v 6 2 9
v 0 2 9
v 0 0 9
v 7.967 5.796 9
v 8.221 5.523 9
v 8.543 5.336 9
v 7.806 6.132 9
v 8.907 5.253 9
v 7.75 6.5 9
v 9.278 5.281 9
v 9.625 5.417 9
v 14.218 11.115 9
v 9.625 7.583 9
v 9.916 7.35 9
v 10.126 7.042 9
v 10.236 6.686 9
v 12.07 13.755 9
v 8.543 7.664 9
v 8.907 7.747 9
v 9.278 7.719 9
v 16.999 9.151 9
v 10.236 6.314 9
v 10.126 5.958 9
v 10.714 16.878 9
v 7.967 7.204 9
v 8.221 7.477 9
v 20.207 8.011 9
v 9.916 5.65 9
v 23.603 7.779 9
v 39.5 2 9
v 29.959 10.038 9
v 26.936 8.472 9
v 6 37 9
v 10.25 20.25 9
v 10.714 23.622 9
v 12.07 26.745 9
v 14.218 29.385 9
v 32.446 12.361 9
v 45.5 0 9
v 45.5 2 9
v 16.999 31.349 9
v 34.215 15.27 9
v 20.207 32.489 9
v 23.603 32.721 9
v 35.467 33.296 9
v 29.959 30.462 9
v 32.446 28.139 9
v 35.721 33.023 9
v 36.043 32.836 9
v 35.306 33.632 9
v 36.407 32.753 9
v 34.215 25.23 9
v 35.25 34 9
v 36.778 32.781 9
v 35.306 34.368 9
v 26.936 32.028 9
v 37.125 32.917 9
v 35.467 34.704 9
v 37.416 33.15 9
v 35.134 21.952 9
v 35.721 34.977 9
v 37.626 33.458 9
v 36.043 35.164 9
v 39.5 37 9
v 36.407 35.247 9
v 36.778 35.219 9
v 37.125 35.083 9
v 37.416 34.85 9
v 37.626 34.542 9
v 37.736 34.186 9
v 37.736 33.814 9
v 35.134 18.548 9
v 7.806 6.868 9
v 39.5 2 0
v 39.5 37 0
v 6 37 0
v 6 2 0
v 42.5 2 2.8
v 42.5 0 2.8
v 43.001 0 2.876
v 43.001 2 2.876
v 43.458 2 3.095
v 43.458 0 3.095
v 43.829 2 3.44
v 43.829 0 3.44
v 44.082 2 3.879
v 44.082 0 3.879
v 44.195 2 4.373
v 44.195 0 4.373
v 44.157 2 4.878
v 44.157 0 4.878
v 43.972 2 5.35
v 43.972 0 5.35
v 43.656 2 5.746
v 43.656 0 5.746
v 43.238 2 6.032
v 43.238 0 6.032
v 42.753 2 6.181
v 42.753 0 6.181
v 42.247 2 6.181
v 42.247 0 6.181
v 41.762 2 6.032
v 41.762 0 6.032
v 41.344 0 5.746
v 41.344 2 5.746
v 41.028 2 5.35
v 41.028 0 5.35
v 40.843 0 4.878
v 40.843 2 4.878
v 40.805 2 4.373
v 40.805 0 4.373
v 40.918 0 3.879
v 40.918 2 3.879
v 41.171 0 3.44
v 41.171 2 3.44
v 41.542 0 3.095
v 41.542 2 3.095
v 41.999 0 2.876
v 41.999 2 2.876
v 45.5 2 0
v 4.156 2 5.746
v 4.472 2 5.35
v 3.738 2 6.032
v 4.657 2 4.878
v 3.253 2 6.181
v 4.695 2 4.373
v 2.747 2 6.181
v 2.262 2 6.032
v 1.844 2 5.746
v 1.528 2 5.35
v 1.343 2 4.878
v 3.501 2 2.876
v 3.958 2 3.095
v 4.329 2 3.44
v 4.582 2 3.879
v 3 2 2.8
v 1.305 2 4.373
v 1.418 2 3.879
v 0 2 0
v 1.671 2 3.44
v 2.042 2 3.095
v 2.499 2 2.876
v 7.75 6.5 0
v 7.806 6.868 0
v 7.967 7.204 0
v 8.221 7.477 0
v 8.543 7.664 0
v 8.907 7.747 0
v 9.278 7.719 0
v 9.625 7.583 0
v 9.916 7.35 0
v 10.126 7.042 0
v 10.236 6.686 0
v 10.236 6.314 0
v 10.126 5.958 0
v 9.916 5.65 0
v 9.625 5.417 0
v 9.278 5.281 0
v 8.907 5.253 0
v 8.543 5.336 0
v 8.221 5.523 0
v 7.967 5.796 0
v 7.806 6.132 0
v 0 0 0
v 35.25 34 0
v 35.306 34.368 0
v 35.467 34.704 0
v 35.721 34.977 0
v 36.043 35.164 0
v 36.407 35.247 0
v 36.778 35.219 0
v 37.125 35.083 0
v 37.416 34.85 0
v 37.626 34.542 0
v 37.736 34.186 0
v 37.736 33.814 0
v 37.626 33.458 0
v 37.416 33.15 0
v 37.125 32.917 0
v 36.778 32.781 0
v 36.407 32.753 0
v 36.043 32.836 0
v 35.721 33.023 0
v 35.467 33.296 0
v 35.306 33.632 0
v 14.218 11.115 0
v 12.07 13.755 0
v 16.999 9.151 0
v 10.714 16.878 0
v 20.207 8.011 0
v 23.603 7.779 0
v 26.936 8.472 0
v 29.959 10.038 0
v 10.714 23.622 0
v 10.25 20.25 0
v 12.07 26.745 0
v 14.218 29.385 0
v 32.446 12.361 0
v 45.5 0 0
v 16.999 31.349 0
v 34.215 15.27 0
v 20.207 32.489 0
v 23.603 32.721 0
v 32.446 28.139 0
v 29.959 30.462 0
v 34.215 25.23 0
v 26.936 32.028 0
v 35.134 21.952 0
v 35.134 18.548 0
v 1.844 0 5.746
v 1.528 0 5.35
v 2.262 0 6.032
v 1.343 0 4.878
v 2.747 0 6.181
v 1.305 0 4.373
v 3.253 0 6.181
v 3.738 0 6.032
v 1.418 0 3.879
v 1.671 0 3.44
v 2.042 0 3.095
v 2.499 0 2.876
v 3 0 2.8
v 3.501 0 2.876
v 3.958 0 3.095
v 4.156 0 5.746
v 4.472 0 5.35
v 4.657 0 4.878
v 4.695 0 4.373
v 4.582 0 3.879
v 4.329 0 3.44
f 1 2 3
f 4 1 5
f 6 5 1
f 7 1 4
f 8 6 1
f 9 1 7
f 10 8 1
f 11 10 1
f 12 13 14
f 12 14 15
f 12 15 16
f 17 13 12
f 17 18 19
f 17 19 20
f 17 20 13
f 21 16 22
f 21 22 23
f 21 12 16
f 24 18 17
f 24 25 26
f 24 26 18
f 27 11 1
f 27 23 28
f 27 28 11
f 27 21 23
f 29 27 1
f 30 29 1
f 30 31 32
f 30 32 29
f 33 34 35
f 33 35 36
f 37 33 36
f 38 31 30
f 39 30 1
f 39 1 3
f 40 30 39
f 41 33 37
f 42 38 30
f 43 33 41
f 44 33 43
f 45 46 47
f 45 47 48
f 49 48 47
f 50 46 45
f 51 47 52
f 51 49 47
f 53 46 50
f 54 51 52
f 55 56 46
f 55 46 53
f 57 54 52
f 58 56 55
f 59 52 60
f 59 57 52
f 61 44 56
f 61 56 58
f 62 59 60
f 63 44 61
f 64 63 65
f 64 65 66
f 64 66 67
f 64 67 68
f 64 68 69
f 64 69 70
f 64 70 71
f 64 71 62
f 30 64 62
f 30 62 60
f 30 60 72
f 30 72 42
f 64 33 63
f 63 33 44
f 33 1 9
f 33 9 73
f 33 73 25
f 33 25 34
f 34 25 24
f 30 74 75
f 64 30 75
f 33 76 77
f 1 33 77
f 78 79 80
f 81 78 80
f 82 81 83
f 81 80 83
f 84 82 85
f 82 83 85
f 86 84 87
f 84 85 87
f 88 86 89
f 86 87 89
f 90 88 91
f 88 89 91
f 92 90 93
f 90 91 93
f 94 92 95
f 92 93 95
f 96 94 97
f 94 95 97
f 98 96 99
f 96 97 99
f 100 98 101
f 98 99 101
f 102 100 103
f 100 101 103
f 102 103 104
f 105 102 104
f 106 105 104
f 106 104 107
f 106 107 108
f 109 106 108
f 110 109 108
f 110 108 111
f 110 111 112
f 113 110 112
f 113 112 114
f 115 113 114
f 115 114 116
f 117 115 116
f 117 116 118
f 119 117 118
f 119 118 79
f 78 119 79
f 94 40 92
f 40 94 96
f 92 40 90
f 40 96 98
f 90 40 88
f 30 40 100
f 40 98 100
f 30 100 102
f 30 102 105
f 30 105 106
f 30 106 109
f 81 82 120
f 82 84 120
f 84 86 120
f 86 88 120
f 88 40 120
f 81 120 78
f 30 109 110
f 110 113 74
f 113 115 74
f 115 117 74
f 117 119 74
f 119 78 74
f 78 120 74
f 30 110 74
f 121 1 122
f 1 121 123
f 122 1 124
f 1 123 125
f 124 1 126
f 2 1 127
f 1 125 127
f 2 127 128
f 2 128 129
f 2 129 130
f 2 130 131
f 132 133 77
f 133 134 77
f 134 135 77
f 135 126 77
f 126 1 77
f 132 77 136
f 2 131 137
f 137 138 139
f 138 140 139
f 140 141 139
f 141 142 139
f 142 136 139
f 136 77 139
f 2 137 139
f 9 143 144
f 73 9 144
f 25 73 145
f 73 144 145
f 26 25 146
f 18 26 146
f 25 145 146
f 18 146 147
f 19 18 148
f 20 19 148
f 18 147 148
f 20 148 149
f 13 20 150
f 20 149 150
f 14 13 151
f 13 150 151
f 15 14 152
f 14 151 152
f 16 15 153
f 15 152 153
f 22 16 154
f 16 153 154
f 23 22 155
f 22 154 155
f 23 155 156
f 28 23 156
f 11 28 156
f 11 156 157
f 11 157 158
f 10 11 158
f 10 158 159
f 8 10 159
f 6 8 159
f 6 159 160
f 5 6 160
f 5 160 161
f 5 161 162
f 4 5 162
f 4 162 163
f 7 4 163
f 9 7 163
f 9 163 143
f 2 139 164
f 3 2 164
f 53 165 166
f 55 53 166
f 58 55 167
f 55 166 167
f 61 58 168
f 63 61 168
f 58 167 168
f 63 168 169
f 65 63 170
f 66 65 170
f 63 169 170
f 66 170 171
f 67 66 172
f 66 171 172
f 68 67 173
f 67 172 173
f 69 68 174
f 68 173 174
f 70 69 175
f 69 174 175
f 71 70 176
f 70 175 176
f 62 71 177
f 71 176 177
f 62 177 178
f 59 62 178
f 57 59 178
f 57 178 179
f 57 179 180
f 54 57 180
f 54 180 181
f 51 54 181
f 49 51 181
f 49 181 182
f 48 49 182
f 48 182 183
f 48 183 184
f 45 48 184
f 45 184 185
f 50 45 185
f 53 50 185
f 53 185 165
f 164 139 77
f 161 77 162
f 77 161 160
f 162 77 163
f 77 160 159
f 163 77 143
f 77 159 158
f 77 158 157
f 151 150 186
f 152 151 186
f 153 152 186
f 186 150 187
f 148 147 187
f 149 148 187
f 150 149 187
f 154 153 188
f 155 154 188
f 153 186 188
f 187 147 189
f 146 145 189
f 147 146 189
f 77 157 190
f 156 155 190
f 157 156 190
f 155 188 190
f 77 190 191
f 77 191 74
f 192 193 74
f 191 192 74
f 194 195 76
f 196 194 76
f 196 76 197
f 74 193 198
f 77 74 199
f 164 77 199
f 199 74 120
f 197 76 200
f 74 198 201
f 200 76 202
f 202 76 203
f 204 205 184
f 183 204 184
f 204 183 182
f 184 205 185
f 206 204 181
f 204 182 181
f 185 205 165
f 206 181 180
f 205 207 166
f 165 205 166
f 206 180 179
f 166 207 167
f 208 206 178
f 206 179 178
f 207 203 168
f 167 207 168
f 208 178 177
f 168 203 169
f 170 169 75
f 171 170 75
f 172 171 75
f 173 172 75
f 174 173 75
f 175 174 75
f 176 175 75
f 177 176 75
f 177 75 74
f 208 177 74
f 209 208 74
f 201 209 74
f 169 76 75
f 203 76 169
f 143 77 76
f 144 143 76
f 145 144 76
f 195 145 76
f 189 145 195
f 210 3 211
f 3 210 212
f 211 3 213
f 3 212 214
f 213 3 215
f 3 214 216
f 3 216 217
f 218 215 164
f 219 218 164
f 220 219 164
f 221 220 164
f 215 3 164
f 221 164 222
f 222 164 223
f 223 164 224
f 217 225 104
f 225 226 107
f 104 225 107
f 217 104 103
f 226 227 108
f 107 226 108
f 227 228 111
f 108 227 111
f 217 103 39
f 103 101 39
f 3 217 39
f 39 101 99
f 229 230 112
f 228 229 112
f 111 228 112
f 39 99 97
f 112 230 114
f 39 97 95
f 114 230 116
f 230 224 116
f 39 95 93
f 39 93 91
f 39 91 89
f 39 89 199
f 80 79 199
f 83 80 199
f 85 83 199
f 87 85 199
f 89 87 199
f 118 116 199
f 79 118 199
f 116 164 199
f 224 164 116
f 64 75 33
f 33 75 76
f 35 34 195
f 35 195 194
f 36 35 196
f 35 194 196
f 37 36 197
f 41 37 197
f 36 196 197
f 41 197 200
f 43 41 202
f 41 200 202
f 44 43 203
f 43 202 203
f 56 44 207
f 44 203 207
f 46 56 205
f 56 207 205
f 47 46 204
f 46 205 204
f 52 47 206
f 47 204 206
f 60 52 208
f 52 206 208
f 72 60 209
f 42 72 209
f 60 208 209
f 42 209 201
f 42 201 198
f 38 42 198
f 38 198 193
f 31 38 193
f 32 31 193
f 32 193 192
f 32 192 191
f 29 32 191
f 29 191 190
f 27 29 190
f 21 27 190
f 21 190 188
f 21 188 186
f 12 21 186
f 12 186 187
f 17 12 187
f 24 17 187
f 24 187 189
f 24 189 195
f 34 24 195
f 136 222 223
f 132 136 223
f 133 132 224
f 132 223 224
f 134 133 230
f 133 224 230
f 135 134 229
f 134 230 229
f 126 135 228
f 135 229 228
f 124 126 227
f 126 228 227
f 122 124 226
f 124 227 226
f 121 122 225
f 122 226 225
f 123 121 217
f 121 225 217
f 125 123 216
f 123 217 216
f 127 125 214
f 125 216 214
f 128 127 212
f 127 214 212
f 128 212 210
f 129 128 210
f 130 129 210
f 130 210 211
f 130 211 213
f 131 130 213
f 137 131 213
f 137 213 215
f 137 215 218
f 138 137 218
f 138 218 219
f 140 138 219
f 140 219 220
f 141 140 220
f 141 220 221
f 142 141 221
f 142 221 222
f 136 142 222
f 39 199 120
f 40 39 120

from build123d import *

# Parameters (mm, degrees)
BOSS_EXTRUDE1_DEPTH    = 9
M3X0_5_TAPPED_HOLE1_D  = 2.5
M3_CLEARANCE_HOLE2_D   = 3.4
F_25_0MM_DOWEL_HOLE1_D = 25


with BuildPart() as part:
    # Sketch1 → Boss-Extrude1 (new body)
    with BuildSketch(Plane.XY):
        Polygon((0, 0), (45.5, 0), (45.5, 2), (39.5, 2), (39.5, 37), (6, 37), (6, 2), (0, 2), align=None)
    extrude(amount=BOSS_EXTRUDE1_DEPTH)

    # M3x0.5 Tapped Hole1 (through all)
    with Locations(Plane(origin=(36.5, 34, 9), x_dir=(1, 0, 0), z_dir=(0, 0, 1))):
        with Locations((0, 0), (-27.5, -27.5)):
            Hole(M3X0_5_TAPPED_HOLE1_D / 2)

    # M3 Clearance Hole2 (through all)
    with Locations(Plane(origin=(42.5, 2, 4.5), x_dir=(0, 0, 1), z_dir=(0, 1, 0))):
        with Locations((0, 0), (0, -39.5)):
            Hole(M3_CLEARANCE_HOLE2_D / 2)

    # Ø25.0mm Dowel Hole1 (through all)
    with Locations(Plane.XY.offset(9)):
        with Locations((22.75, 20.25)):
            Hole(F_25_0MM_DOWEL_HOLE1_D / 2)


solid = part.part
